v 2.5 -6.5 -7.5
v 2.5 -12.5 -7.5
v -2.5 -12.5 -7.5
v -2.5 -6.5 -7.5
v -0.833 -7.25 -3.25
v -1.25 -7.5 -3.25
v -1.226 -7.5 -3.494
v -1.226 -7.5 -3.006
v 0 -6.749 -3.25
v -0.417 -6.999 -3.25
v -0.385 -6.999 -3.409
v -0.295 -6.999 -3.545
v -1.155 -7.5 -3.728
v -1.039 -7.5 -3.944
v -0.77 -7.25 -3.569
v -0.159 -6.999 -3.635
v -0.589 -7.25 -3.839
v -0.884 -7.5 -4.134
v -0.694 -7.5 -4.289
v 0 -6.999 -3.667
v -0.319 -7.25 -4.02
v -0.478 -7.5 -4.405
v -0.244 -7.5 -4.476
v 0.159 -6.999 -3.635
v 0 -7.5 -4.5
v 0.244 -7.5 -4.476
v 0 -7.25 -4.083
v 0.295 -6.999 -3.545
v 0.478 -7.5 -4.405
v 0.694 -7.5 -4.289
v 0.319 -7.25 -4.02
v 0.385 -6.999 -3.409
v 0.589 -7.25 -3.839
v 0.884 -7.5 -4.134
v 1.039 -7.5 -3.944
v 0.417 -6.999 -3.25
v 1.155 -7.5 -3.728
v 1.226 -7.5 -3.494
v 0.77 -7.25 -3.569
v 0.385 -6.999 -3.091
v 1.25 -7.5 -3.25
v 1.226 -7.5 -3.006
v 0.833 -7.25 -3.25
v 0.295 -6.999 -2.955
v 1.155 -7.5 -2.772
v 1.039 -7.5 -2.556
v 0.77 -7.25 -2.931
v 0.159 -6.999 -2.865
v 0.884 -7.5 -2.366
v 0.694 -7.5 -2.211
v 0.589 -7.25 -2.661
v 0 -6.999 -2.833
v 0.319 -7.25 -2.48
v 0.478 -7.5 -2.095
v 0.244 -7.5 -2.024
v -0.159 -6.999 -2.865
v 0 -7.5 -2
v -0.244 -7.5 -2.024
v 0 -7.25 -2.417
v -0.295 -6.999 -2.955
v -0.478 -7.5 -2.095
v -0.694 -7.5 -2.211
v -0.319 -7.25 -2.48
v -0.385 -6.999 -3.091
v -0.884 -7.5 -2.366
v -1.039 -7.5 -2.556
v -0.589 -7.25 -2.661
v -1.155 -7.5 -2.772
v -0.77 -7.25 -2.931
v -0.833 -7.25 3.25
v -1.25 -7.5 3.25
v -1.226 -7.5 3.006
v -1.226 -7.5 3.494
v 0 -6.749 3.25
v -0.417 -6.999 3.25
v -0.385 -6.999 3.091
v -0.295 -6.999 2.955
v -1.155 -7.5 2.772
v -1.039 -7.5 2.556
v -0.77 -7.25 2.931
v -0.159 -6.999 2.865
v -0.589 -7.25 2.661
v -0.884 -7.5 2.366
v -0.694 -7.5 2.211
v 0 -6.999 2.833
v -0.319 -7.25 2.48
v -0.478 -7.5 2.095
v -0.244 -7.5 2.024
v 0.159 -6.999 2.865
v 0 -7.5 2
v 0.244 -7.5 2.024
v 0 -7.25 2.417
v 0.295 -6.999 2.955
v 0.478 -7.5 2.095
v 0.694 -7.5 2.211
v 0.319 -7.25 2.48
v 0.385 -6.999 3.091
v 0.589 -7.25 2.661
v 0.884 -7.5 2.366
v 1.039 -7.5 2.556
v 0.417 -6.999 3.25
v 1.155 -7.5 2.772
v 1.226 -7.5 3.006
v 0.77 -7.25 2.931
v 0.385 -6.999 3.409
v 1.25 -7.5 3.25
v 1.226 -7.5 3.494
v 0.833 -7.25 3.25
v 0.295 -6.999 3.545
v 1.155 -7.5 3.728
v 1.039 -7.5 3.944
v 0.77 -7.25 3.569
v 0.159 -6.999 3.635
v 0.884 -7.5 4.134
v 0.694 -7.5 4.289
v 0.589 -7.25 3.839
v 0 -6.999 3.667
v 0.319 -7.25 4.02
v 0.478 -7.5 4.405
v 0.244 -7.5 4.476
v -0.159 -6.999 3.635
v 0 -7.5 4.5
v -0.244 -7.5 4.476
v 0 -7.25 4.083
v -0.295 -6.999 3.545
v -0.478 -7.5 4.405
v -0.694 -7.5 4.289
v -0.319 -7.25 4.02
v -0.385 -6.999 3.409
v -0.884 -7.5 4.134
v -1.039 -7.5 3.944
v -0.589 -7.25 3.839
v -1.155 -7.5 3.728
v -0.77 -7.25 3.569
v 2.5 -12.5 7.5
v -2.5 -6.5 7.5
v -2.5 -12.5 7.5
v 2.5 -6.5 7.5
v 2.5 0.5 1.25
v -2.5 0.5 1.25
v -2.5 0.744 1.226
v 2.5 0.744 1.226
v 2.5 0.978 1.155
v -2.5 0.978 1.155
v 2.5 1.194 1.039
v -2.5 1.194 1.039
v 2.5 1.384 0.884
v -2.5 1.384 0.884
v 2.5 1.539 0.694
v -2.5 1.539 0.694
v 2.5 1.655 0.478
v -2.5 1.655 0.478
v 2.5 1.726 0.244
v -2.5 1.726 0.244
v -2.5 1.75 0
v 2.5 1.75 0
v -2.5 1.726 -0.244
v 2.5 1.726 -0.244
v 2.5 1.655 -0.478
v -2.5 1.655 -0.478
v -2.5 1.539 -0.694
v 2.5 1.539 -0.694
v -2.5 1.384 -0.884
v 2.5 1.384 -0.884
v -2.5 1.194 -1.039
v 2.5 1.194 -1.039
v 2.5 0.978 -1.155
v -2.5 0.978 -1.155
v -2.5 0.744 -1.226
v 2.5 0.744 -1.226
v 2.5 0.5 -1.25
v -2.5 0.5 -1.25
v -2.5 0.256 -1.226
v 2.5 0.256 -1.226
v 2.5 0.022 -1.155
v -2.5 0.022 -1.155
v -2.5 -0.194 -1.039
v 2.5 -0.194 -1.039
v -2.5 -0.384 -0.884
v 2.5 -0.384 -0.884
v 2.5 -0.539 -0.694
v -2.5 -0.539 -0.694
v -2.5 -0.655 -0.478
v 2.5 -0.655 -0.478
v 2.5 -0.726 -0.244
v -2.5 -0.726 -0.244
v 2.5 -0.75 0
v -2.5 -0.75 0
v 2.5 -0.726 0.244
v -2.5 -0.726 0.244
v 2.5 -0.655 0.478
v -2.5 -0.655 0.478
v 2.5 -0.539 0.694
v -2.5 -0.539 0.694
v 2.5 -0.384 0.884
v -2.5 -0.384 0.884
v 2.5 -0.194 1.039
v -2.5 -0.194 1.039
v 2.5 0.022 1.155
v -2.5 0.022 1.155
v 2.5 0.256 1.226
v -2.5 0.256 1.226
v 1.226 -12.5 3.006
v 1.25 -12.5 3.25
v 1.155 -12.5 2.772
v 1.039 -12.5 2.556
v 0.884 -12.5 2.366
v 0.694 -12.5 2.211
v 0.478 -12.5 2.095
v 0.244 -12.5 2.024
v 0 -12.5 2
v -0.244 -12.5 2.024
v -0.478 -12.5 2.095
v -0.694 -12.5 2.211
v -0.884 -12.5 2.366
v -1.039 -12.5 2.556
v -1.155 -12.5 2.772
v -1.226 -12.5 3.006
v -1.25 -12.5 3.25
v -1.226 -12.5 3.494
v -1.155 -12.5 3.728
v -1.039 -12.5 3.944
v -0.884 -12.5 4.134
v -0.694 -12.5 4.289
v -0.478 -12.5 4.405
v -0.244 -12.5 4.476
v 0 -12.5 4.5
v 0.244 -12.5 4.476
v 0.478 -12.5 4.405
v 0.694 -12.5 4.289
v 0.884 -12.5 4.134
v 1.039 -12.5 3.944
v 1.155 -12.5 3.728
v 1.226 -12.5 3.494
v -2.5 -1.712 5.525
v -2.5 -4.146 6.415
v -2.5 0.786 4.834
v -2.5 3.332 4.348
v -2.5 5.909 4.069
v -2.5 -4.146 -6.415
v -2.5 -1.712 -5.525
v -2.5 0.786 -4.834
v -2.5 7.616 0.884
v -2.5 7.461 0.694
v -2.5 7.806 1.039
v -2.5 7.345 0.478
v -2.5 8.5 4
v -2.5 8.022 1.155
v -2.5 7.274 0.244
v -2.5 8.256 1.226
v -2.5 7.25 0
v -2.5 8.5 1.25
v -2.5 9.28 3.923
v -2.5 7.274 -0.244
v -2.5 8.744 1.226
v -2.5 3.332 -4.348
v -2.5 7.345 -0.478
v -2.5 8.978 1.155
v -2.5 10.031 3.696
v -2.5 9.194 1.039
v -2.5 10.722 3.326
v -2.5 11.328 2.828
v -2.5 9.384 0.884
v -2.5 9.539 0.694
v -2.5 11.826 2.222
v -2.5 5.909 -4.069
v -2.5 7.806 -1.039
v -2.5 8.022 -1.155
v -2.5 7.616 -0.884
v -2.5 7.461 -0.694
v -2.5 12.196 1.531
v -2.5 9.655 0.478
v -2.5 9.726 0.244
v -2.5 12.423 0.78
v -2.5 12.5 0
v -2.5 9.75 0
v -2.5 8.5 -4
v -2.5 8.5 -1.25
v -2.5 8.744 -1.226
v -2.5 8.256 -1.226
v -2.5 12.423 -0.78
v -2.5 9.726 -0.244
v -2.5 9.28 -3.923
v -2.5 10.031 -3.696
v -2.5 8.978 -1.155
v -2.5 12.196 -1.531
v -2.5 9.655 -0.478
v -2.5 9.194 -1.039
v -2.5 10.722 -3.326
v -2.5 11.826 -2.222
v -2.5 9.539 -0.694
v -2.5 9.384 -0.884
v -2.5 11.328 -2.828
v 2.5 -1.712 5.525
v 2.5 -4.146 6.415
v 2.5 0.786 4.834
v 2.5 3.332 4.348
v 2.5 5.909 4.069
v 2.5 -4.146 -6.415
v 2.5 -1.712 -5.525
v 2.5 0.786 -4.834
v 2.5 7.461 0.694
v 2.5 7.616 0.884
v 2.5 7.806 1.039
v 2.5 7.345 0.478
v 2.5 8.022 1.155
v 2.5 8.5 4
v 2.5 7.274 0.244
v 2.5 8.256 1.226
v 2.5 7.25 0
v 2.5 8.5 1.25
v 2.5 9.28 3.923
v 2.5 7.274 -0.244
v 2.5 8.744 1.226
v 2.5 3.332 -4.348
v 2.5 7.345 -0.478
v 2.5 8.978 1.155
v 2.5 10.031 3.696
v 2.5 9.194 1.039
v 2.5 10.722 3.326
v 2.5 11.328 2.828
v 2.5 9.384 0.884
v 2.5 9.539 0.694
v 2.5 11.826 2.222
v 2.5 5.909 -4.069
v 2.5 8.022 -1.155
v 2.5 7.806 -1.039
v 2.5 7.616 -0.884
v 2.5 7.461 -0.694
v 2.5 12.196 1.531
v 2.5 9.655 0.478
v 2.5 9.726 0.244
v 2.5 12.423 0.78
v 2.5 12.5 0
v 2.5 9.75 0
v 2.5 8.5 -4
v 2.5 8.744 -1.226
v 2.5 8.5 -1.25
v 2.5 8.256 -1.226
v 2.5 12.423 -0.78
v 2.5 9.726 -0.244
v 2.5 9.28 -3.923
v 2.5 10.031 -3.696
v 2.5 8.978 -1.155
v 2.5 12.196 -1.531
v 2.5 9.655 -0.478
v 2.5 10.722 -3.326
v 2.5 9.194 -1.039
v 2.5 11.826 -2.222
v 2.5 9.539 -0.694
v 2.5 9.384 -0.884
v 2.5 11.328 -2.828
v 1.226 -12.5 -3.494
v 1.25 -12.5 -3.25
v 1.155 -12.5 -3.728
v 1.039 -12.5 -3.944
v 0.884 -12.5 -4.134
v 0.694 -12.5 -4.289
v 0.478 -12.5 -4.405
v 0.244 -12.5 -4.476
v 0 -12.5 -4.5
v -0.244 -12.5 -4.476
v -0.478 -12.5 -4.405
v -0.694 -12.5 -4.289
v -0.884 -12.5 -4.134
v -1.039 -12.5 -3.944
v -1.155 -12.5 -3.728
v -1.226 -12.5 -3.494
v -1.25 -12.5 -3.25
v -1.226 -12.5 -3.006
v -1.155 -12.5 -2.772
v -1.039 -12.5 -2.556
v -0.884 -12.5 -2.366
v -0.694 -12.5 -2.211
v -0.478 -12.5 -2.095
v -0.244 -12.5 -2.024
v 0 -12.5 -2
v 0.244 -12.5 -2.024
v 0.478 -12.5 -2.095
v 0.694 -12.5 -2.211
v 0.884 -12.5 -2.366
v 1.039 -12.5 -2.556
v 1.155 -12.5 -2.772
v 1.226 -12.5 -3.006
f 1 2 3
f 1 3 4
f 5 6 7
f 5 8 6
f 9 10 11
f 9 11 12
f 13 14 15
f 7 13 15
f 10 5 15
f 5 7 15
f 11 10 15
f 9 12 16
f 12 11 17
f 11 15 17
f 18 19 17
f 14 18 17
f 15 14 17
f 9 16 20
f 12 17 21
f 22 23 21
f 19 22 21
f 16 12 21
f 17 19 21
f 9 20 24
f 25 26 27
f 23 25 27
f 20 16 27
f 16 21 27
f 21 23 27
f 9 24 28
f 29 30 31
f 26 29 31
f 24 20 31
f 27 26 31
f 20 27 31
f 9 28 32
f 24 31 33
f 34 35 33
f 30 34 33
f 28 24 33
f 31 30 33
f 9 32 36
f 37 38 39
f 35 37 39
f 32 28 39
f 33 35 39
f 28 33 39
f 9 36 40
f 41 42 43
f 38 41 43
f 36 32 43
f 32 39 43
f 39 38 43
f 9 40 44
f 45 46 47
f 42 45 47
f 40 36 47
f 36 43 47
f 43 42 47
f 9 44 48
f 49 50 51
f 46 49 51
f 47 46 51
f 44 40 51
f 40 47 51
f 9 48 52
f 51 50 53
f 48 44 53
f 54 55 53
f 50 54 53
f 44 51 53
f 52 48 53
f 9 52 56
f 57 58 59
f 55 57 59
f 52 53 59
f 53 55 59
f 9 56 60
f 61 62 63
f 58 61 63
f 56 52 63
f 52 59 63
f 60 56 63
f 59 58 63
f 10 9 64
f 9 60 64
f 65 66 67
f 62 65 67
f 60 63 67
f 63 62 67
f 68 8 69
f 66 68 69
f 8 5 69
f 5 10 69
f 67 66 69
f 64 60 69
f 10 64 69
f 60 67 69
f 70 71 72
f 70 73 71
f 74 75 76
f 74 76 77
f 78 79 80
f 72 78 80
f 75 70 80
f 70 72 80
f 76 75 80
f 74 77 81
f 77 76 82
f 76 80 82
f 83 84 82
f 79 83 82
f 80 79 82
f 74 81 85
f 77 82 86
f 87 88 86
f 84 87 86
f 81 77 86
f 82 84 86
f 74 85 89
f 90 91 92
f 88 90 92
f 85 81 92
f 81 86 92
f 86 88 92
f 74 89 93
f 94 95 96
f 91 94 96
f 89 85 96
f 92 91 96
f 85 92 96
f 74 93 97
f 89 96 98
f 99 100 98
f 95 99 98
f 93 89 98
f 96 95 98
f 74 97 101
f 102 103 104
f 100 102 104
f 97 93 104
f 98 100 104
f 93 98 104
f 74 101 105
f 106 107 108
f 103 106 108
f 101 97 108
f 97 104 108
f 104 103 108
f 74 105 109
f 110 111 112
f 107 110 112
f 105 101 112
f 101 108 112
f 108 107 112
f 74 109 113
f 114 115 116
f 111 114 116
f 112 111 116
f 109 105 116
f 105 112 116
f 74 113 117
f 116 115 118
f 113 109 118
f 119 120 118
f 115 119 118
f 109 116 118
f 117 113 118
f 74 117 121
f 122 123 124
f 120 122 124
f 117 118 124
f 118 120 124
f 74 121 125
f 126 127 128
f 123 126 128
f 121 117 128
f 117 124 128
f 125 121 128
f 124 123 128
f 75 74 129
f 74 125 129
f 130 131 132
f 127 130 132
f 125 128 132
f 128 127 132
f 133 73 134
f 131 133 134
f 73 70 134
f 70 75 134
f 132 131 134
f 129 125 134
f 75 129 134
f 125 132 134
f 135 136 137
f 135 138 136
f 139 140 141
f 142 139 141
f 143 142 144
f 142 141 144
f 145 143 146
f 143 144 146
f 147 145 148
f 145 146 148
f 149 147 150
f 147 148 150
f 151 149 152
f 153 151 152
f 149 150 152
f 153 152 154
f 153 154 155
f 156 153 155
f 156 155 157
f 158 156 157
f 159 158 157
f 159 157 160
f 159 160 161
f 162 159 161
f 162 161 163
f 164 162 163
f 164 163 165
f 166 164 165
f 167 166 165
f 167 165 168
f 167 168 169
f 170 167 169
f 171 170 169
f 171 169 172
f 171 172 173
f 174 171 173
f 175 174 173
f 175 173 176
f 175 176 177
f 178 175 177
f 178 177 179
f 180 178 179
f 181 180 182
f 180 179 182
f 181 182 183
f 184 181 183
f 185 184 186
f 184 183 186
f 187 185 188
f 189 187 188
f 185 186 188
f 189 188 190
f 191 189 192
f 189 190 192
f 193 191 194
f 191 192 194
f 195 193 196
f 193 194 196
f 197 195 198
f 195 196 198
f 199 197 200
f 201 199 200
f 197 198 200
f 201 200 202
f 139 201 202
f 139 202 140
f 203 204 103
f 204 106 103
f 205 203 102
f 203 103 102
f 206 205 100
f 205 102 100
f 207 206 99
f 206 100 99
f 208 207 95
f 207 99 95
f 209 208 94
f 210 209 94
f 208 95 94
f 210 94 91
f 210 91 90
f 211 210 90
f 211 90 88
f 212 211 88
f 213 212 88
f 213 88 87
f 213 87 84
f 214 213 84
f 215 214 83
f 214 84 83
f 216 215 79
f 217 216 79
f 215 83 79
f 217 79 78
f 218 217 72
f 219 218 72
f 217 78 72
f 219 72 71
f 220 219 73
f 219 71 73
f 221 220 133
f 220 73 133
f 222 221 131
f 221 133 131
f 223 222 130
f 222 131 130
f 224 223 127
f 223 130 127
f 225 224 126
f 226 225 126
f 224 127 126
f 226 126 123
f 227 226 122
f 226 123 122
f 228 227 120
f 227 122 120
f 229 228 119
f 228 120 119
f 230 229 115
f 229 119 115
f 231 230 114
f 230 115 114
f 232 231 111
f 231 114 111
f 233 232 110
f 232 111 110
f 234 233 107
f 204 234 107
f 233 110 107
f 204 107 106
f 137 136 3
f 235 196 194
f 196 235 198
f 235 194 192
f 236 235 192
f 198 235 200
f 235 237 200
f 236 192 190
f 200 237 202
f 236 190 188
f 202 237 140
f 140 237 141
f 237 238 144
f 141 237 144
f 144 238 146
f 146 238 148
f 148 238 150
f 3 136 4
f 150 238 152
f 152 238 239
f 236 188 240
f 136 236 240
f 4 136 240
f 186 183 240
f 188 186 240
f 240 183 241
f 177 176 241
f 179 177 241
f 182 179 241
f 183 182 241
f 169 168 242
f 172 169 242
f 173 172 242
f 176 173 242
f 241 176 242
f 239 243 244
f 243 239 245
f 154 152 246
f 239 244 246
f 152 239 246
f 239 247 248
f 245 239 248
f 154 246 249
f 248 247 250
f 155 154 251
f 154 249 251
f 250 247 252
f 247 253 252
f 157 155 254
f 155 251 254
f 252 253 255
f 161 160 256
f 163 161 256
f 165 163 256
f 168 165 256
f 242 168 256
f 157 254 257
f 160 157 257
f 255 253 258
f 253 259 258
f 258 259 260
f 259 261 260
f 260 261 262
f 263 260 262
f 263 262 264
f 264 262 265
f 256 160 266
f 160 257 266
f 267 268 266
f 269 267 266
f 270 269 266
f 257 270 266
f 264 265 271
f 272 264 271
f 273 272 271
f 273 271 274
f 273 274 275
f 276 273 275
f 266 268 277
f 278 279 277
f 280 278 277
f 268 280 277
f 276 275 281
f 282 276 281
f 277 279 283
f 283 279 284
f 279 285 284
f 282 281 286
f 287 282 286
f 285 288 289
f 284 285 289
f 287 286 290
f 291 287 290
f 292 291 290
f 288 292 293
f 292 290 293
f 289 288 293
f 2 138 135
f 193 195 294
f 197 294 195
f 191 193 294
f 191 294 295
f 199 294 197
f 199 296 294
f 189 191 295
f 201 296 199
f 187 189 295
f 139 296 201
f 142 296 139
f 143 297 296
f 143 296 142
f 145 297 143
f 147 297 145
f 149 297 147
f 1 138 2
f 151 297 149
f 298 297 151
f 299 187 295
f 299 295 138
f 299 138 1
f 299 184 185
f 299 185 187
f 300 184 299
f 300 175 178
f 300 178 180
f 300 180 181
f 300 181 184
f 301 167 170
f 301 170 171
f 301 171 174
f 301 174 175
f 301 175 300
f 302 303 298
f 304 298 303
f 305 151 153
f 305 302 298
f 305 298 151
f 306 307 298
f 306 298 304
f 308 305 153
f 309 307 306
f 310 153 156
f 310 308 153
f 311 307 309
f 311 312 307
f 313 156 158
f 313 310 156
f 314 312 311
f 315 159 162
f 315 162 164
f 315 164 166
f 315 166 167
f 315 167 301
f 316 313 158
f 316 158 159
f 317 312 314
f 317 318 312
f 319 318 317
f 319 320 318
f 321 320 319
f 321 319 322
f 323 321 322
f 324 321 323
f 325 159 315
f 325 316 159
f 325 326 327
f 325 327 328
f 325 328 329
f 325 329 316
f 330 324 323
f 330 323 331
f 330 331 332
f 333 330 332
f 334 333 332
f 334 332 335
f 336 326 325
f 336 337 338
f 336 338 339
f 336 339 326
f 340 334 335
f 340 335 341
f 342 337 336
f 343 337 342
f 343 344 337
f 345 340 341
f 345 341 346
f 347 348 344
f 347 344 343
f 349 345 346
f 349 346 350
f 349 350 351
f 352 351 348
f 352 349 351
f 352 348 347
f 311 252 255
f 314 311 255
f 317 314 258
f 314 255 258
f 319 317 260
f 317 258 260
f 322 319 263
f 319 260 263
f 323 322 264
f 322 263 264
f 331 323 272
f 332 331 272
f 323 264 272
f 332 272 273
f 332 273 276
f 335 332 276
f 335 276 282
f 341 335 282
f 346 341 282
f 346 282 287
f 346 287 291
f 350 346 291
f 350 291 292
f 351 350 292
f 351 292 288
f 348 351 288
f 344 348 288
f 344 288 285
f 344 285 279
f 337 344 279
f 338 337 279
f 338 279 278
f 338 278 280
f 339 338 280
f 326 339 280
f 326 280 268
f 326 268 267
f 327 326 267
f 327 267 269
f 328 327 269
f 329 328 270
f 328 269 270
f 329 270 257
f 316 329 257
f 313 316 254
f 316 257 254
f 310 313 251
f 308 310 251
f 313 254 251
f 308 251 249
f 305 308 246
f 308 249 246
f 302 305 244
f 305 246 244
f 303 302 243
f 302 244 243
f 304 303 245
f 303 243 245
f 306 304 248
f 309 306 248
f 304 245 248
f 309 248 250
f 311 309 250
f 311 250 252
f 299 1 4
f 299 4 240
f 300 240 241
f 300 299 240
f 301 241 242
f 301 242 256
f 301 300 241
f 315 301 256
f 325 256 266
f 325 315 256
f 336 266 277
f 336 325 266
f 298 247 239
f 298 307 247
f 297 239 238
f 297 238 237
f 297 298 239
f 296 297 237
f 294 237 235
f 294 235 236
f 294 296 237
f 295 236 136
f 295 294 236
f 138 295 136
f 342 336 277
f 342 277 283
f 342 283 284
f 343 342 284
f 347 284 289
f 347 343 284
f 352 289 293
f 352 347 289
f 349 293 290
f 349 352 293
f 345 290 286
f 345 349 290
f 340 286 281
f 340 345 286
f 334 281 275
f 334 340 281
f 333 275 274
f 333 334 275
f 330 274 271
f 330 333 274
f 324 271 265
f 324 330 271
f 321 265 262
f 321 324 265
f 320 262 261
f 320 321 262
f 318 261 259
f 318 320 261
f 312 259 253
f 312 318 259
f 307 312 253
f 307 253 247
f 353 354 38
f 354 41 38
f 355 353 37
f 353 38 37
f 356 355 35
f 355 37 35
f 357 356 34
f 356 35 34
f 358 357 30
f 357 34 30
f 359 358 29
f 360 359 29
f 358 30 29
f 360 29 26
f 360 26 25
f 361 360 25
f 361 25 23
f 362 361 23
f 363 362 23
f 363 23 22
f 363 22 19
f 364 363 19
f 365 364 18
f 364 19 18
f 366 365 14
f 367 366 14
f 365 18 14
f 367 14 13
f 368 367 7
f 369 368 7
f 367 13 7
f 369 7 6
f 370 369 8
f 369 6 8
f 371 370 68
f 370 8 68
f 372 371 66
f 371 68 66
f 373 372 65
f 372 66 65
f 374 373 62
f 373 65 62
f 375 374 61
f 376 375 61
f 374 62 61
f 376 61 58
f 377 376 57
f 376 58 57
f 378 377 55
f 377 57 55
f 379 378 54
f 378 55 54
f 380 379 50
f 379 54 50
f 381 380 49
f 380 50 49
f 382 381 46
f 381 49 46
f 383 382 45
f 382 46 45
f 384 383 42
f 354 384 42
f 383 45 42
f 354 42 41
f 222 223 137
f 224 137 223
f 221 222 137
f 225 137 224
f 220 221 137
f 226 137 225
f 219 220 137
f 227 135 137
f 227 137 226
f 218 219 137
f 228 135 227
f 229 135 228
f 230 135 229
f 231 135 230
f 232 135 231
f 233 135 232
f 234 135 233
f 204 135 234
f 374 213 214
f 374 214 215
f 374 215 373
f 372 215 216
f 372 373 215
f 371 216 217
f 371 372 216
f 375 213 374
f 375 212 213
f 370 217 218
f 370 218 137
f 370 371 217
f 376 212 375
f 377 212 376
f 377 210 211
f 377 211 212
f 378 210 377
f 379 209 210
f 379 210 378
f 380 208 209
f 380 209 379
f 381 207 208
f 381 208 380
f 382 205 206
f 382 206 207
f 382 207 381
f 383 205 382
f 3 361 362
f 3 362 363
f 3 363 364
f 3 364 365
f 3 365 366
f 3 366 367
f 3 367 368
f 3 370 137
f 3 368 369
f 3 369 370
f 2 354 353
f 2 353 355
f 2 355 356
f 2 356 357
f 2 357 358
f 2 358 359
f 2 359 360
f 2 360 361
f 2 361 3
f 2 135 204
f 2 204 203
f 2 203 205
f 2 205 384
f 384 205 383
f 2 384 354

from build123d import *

# Parameters (mm, degrees)
BOSS_EXTRUDE1_DEPTH         = 2.5
TAP_DRILL_FOR_M3_TAP1_D     = 2.5
TAP_DRILL_FOR_M3_TAP2_D     = 2.5
TAP_DRILL_FOR_M3_TAP2_DEPTH = 5
TAP_DRILL_FOR_M3_TAP2_TIP   = 0.751075774


with BuildPart() as part:
    # Sketch1 → Boss-Extrude1 (new, symmetric)
    with BuildSketch(Plane(origin=(0, 0, 0), x_dir=(0, 0, -1), z_dir=(1, 0, 0))):
        with BuildLine():
            Line((-7.5, -12.5), (7.5, -12.5))
            Line((7.5, -12.5), (7.5, -6.5))
            ThreePointArc((7.5, -6.5), (4.834023326, 0.786272109), (4, 8.5))
            ThreePointArc((4, 8.5), (0, 12.5), (-4, 8.5))
            ThreePointArc((-4, 8.5), (-4.834023326, 0.786272109), (-7.5, -6.5))
            Line((-7.5, -6.5), (-7.5, -12.5))
        make_face()
    extrude(amount=BOSS_EXTRUDE1_DEPTH, both=True)

    # Tap Drill for M3 Tap1 (through all)
    with Locations(Plane(origin=(2.5, 0, 0), x_dir=(0, 0, -1), z_dir=(1, 0, 0))):
        with Locations((0, 8.5), (0, 0.5)):
            Hole(TAP_DRILL_FOR_M3_TAP1_D / 2)

    # Tap Drill for M3 Tap2
    with Locations(Plane(origin=(0, -12.5, 0), x_dir=(-1, 0, 0), z_dir=(0, -1, 0))):
        with Locations((0, -3.25), (0, 3.25)):
            Hole(TAP_DRILL_FOR_M3_TAP2_D / 2, depth=TAP_DRILL_FOR_M3_TAP2_DEPTH)
            with Locations((0, 0, -(TAP_DRILL_FOR_M3_TAP2_DEPTH + TAP_DRILL_FOR_M3_TAP2_TIP / 2))):  # 118° drill point
                Cone(0, TAP_DRILL_FOR_M3_TAP2_D / 2, TAP_DRILL_FOR_M3_TAP2_TIP, mode=Mode.SUBTRACT)


solid = part.part
